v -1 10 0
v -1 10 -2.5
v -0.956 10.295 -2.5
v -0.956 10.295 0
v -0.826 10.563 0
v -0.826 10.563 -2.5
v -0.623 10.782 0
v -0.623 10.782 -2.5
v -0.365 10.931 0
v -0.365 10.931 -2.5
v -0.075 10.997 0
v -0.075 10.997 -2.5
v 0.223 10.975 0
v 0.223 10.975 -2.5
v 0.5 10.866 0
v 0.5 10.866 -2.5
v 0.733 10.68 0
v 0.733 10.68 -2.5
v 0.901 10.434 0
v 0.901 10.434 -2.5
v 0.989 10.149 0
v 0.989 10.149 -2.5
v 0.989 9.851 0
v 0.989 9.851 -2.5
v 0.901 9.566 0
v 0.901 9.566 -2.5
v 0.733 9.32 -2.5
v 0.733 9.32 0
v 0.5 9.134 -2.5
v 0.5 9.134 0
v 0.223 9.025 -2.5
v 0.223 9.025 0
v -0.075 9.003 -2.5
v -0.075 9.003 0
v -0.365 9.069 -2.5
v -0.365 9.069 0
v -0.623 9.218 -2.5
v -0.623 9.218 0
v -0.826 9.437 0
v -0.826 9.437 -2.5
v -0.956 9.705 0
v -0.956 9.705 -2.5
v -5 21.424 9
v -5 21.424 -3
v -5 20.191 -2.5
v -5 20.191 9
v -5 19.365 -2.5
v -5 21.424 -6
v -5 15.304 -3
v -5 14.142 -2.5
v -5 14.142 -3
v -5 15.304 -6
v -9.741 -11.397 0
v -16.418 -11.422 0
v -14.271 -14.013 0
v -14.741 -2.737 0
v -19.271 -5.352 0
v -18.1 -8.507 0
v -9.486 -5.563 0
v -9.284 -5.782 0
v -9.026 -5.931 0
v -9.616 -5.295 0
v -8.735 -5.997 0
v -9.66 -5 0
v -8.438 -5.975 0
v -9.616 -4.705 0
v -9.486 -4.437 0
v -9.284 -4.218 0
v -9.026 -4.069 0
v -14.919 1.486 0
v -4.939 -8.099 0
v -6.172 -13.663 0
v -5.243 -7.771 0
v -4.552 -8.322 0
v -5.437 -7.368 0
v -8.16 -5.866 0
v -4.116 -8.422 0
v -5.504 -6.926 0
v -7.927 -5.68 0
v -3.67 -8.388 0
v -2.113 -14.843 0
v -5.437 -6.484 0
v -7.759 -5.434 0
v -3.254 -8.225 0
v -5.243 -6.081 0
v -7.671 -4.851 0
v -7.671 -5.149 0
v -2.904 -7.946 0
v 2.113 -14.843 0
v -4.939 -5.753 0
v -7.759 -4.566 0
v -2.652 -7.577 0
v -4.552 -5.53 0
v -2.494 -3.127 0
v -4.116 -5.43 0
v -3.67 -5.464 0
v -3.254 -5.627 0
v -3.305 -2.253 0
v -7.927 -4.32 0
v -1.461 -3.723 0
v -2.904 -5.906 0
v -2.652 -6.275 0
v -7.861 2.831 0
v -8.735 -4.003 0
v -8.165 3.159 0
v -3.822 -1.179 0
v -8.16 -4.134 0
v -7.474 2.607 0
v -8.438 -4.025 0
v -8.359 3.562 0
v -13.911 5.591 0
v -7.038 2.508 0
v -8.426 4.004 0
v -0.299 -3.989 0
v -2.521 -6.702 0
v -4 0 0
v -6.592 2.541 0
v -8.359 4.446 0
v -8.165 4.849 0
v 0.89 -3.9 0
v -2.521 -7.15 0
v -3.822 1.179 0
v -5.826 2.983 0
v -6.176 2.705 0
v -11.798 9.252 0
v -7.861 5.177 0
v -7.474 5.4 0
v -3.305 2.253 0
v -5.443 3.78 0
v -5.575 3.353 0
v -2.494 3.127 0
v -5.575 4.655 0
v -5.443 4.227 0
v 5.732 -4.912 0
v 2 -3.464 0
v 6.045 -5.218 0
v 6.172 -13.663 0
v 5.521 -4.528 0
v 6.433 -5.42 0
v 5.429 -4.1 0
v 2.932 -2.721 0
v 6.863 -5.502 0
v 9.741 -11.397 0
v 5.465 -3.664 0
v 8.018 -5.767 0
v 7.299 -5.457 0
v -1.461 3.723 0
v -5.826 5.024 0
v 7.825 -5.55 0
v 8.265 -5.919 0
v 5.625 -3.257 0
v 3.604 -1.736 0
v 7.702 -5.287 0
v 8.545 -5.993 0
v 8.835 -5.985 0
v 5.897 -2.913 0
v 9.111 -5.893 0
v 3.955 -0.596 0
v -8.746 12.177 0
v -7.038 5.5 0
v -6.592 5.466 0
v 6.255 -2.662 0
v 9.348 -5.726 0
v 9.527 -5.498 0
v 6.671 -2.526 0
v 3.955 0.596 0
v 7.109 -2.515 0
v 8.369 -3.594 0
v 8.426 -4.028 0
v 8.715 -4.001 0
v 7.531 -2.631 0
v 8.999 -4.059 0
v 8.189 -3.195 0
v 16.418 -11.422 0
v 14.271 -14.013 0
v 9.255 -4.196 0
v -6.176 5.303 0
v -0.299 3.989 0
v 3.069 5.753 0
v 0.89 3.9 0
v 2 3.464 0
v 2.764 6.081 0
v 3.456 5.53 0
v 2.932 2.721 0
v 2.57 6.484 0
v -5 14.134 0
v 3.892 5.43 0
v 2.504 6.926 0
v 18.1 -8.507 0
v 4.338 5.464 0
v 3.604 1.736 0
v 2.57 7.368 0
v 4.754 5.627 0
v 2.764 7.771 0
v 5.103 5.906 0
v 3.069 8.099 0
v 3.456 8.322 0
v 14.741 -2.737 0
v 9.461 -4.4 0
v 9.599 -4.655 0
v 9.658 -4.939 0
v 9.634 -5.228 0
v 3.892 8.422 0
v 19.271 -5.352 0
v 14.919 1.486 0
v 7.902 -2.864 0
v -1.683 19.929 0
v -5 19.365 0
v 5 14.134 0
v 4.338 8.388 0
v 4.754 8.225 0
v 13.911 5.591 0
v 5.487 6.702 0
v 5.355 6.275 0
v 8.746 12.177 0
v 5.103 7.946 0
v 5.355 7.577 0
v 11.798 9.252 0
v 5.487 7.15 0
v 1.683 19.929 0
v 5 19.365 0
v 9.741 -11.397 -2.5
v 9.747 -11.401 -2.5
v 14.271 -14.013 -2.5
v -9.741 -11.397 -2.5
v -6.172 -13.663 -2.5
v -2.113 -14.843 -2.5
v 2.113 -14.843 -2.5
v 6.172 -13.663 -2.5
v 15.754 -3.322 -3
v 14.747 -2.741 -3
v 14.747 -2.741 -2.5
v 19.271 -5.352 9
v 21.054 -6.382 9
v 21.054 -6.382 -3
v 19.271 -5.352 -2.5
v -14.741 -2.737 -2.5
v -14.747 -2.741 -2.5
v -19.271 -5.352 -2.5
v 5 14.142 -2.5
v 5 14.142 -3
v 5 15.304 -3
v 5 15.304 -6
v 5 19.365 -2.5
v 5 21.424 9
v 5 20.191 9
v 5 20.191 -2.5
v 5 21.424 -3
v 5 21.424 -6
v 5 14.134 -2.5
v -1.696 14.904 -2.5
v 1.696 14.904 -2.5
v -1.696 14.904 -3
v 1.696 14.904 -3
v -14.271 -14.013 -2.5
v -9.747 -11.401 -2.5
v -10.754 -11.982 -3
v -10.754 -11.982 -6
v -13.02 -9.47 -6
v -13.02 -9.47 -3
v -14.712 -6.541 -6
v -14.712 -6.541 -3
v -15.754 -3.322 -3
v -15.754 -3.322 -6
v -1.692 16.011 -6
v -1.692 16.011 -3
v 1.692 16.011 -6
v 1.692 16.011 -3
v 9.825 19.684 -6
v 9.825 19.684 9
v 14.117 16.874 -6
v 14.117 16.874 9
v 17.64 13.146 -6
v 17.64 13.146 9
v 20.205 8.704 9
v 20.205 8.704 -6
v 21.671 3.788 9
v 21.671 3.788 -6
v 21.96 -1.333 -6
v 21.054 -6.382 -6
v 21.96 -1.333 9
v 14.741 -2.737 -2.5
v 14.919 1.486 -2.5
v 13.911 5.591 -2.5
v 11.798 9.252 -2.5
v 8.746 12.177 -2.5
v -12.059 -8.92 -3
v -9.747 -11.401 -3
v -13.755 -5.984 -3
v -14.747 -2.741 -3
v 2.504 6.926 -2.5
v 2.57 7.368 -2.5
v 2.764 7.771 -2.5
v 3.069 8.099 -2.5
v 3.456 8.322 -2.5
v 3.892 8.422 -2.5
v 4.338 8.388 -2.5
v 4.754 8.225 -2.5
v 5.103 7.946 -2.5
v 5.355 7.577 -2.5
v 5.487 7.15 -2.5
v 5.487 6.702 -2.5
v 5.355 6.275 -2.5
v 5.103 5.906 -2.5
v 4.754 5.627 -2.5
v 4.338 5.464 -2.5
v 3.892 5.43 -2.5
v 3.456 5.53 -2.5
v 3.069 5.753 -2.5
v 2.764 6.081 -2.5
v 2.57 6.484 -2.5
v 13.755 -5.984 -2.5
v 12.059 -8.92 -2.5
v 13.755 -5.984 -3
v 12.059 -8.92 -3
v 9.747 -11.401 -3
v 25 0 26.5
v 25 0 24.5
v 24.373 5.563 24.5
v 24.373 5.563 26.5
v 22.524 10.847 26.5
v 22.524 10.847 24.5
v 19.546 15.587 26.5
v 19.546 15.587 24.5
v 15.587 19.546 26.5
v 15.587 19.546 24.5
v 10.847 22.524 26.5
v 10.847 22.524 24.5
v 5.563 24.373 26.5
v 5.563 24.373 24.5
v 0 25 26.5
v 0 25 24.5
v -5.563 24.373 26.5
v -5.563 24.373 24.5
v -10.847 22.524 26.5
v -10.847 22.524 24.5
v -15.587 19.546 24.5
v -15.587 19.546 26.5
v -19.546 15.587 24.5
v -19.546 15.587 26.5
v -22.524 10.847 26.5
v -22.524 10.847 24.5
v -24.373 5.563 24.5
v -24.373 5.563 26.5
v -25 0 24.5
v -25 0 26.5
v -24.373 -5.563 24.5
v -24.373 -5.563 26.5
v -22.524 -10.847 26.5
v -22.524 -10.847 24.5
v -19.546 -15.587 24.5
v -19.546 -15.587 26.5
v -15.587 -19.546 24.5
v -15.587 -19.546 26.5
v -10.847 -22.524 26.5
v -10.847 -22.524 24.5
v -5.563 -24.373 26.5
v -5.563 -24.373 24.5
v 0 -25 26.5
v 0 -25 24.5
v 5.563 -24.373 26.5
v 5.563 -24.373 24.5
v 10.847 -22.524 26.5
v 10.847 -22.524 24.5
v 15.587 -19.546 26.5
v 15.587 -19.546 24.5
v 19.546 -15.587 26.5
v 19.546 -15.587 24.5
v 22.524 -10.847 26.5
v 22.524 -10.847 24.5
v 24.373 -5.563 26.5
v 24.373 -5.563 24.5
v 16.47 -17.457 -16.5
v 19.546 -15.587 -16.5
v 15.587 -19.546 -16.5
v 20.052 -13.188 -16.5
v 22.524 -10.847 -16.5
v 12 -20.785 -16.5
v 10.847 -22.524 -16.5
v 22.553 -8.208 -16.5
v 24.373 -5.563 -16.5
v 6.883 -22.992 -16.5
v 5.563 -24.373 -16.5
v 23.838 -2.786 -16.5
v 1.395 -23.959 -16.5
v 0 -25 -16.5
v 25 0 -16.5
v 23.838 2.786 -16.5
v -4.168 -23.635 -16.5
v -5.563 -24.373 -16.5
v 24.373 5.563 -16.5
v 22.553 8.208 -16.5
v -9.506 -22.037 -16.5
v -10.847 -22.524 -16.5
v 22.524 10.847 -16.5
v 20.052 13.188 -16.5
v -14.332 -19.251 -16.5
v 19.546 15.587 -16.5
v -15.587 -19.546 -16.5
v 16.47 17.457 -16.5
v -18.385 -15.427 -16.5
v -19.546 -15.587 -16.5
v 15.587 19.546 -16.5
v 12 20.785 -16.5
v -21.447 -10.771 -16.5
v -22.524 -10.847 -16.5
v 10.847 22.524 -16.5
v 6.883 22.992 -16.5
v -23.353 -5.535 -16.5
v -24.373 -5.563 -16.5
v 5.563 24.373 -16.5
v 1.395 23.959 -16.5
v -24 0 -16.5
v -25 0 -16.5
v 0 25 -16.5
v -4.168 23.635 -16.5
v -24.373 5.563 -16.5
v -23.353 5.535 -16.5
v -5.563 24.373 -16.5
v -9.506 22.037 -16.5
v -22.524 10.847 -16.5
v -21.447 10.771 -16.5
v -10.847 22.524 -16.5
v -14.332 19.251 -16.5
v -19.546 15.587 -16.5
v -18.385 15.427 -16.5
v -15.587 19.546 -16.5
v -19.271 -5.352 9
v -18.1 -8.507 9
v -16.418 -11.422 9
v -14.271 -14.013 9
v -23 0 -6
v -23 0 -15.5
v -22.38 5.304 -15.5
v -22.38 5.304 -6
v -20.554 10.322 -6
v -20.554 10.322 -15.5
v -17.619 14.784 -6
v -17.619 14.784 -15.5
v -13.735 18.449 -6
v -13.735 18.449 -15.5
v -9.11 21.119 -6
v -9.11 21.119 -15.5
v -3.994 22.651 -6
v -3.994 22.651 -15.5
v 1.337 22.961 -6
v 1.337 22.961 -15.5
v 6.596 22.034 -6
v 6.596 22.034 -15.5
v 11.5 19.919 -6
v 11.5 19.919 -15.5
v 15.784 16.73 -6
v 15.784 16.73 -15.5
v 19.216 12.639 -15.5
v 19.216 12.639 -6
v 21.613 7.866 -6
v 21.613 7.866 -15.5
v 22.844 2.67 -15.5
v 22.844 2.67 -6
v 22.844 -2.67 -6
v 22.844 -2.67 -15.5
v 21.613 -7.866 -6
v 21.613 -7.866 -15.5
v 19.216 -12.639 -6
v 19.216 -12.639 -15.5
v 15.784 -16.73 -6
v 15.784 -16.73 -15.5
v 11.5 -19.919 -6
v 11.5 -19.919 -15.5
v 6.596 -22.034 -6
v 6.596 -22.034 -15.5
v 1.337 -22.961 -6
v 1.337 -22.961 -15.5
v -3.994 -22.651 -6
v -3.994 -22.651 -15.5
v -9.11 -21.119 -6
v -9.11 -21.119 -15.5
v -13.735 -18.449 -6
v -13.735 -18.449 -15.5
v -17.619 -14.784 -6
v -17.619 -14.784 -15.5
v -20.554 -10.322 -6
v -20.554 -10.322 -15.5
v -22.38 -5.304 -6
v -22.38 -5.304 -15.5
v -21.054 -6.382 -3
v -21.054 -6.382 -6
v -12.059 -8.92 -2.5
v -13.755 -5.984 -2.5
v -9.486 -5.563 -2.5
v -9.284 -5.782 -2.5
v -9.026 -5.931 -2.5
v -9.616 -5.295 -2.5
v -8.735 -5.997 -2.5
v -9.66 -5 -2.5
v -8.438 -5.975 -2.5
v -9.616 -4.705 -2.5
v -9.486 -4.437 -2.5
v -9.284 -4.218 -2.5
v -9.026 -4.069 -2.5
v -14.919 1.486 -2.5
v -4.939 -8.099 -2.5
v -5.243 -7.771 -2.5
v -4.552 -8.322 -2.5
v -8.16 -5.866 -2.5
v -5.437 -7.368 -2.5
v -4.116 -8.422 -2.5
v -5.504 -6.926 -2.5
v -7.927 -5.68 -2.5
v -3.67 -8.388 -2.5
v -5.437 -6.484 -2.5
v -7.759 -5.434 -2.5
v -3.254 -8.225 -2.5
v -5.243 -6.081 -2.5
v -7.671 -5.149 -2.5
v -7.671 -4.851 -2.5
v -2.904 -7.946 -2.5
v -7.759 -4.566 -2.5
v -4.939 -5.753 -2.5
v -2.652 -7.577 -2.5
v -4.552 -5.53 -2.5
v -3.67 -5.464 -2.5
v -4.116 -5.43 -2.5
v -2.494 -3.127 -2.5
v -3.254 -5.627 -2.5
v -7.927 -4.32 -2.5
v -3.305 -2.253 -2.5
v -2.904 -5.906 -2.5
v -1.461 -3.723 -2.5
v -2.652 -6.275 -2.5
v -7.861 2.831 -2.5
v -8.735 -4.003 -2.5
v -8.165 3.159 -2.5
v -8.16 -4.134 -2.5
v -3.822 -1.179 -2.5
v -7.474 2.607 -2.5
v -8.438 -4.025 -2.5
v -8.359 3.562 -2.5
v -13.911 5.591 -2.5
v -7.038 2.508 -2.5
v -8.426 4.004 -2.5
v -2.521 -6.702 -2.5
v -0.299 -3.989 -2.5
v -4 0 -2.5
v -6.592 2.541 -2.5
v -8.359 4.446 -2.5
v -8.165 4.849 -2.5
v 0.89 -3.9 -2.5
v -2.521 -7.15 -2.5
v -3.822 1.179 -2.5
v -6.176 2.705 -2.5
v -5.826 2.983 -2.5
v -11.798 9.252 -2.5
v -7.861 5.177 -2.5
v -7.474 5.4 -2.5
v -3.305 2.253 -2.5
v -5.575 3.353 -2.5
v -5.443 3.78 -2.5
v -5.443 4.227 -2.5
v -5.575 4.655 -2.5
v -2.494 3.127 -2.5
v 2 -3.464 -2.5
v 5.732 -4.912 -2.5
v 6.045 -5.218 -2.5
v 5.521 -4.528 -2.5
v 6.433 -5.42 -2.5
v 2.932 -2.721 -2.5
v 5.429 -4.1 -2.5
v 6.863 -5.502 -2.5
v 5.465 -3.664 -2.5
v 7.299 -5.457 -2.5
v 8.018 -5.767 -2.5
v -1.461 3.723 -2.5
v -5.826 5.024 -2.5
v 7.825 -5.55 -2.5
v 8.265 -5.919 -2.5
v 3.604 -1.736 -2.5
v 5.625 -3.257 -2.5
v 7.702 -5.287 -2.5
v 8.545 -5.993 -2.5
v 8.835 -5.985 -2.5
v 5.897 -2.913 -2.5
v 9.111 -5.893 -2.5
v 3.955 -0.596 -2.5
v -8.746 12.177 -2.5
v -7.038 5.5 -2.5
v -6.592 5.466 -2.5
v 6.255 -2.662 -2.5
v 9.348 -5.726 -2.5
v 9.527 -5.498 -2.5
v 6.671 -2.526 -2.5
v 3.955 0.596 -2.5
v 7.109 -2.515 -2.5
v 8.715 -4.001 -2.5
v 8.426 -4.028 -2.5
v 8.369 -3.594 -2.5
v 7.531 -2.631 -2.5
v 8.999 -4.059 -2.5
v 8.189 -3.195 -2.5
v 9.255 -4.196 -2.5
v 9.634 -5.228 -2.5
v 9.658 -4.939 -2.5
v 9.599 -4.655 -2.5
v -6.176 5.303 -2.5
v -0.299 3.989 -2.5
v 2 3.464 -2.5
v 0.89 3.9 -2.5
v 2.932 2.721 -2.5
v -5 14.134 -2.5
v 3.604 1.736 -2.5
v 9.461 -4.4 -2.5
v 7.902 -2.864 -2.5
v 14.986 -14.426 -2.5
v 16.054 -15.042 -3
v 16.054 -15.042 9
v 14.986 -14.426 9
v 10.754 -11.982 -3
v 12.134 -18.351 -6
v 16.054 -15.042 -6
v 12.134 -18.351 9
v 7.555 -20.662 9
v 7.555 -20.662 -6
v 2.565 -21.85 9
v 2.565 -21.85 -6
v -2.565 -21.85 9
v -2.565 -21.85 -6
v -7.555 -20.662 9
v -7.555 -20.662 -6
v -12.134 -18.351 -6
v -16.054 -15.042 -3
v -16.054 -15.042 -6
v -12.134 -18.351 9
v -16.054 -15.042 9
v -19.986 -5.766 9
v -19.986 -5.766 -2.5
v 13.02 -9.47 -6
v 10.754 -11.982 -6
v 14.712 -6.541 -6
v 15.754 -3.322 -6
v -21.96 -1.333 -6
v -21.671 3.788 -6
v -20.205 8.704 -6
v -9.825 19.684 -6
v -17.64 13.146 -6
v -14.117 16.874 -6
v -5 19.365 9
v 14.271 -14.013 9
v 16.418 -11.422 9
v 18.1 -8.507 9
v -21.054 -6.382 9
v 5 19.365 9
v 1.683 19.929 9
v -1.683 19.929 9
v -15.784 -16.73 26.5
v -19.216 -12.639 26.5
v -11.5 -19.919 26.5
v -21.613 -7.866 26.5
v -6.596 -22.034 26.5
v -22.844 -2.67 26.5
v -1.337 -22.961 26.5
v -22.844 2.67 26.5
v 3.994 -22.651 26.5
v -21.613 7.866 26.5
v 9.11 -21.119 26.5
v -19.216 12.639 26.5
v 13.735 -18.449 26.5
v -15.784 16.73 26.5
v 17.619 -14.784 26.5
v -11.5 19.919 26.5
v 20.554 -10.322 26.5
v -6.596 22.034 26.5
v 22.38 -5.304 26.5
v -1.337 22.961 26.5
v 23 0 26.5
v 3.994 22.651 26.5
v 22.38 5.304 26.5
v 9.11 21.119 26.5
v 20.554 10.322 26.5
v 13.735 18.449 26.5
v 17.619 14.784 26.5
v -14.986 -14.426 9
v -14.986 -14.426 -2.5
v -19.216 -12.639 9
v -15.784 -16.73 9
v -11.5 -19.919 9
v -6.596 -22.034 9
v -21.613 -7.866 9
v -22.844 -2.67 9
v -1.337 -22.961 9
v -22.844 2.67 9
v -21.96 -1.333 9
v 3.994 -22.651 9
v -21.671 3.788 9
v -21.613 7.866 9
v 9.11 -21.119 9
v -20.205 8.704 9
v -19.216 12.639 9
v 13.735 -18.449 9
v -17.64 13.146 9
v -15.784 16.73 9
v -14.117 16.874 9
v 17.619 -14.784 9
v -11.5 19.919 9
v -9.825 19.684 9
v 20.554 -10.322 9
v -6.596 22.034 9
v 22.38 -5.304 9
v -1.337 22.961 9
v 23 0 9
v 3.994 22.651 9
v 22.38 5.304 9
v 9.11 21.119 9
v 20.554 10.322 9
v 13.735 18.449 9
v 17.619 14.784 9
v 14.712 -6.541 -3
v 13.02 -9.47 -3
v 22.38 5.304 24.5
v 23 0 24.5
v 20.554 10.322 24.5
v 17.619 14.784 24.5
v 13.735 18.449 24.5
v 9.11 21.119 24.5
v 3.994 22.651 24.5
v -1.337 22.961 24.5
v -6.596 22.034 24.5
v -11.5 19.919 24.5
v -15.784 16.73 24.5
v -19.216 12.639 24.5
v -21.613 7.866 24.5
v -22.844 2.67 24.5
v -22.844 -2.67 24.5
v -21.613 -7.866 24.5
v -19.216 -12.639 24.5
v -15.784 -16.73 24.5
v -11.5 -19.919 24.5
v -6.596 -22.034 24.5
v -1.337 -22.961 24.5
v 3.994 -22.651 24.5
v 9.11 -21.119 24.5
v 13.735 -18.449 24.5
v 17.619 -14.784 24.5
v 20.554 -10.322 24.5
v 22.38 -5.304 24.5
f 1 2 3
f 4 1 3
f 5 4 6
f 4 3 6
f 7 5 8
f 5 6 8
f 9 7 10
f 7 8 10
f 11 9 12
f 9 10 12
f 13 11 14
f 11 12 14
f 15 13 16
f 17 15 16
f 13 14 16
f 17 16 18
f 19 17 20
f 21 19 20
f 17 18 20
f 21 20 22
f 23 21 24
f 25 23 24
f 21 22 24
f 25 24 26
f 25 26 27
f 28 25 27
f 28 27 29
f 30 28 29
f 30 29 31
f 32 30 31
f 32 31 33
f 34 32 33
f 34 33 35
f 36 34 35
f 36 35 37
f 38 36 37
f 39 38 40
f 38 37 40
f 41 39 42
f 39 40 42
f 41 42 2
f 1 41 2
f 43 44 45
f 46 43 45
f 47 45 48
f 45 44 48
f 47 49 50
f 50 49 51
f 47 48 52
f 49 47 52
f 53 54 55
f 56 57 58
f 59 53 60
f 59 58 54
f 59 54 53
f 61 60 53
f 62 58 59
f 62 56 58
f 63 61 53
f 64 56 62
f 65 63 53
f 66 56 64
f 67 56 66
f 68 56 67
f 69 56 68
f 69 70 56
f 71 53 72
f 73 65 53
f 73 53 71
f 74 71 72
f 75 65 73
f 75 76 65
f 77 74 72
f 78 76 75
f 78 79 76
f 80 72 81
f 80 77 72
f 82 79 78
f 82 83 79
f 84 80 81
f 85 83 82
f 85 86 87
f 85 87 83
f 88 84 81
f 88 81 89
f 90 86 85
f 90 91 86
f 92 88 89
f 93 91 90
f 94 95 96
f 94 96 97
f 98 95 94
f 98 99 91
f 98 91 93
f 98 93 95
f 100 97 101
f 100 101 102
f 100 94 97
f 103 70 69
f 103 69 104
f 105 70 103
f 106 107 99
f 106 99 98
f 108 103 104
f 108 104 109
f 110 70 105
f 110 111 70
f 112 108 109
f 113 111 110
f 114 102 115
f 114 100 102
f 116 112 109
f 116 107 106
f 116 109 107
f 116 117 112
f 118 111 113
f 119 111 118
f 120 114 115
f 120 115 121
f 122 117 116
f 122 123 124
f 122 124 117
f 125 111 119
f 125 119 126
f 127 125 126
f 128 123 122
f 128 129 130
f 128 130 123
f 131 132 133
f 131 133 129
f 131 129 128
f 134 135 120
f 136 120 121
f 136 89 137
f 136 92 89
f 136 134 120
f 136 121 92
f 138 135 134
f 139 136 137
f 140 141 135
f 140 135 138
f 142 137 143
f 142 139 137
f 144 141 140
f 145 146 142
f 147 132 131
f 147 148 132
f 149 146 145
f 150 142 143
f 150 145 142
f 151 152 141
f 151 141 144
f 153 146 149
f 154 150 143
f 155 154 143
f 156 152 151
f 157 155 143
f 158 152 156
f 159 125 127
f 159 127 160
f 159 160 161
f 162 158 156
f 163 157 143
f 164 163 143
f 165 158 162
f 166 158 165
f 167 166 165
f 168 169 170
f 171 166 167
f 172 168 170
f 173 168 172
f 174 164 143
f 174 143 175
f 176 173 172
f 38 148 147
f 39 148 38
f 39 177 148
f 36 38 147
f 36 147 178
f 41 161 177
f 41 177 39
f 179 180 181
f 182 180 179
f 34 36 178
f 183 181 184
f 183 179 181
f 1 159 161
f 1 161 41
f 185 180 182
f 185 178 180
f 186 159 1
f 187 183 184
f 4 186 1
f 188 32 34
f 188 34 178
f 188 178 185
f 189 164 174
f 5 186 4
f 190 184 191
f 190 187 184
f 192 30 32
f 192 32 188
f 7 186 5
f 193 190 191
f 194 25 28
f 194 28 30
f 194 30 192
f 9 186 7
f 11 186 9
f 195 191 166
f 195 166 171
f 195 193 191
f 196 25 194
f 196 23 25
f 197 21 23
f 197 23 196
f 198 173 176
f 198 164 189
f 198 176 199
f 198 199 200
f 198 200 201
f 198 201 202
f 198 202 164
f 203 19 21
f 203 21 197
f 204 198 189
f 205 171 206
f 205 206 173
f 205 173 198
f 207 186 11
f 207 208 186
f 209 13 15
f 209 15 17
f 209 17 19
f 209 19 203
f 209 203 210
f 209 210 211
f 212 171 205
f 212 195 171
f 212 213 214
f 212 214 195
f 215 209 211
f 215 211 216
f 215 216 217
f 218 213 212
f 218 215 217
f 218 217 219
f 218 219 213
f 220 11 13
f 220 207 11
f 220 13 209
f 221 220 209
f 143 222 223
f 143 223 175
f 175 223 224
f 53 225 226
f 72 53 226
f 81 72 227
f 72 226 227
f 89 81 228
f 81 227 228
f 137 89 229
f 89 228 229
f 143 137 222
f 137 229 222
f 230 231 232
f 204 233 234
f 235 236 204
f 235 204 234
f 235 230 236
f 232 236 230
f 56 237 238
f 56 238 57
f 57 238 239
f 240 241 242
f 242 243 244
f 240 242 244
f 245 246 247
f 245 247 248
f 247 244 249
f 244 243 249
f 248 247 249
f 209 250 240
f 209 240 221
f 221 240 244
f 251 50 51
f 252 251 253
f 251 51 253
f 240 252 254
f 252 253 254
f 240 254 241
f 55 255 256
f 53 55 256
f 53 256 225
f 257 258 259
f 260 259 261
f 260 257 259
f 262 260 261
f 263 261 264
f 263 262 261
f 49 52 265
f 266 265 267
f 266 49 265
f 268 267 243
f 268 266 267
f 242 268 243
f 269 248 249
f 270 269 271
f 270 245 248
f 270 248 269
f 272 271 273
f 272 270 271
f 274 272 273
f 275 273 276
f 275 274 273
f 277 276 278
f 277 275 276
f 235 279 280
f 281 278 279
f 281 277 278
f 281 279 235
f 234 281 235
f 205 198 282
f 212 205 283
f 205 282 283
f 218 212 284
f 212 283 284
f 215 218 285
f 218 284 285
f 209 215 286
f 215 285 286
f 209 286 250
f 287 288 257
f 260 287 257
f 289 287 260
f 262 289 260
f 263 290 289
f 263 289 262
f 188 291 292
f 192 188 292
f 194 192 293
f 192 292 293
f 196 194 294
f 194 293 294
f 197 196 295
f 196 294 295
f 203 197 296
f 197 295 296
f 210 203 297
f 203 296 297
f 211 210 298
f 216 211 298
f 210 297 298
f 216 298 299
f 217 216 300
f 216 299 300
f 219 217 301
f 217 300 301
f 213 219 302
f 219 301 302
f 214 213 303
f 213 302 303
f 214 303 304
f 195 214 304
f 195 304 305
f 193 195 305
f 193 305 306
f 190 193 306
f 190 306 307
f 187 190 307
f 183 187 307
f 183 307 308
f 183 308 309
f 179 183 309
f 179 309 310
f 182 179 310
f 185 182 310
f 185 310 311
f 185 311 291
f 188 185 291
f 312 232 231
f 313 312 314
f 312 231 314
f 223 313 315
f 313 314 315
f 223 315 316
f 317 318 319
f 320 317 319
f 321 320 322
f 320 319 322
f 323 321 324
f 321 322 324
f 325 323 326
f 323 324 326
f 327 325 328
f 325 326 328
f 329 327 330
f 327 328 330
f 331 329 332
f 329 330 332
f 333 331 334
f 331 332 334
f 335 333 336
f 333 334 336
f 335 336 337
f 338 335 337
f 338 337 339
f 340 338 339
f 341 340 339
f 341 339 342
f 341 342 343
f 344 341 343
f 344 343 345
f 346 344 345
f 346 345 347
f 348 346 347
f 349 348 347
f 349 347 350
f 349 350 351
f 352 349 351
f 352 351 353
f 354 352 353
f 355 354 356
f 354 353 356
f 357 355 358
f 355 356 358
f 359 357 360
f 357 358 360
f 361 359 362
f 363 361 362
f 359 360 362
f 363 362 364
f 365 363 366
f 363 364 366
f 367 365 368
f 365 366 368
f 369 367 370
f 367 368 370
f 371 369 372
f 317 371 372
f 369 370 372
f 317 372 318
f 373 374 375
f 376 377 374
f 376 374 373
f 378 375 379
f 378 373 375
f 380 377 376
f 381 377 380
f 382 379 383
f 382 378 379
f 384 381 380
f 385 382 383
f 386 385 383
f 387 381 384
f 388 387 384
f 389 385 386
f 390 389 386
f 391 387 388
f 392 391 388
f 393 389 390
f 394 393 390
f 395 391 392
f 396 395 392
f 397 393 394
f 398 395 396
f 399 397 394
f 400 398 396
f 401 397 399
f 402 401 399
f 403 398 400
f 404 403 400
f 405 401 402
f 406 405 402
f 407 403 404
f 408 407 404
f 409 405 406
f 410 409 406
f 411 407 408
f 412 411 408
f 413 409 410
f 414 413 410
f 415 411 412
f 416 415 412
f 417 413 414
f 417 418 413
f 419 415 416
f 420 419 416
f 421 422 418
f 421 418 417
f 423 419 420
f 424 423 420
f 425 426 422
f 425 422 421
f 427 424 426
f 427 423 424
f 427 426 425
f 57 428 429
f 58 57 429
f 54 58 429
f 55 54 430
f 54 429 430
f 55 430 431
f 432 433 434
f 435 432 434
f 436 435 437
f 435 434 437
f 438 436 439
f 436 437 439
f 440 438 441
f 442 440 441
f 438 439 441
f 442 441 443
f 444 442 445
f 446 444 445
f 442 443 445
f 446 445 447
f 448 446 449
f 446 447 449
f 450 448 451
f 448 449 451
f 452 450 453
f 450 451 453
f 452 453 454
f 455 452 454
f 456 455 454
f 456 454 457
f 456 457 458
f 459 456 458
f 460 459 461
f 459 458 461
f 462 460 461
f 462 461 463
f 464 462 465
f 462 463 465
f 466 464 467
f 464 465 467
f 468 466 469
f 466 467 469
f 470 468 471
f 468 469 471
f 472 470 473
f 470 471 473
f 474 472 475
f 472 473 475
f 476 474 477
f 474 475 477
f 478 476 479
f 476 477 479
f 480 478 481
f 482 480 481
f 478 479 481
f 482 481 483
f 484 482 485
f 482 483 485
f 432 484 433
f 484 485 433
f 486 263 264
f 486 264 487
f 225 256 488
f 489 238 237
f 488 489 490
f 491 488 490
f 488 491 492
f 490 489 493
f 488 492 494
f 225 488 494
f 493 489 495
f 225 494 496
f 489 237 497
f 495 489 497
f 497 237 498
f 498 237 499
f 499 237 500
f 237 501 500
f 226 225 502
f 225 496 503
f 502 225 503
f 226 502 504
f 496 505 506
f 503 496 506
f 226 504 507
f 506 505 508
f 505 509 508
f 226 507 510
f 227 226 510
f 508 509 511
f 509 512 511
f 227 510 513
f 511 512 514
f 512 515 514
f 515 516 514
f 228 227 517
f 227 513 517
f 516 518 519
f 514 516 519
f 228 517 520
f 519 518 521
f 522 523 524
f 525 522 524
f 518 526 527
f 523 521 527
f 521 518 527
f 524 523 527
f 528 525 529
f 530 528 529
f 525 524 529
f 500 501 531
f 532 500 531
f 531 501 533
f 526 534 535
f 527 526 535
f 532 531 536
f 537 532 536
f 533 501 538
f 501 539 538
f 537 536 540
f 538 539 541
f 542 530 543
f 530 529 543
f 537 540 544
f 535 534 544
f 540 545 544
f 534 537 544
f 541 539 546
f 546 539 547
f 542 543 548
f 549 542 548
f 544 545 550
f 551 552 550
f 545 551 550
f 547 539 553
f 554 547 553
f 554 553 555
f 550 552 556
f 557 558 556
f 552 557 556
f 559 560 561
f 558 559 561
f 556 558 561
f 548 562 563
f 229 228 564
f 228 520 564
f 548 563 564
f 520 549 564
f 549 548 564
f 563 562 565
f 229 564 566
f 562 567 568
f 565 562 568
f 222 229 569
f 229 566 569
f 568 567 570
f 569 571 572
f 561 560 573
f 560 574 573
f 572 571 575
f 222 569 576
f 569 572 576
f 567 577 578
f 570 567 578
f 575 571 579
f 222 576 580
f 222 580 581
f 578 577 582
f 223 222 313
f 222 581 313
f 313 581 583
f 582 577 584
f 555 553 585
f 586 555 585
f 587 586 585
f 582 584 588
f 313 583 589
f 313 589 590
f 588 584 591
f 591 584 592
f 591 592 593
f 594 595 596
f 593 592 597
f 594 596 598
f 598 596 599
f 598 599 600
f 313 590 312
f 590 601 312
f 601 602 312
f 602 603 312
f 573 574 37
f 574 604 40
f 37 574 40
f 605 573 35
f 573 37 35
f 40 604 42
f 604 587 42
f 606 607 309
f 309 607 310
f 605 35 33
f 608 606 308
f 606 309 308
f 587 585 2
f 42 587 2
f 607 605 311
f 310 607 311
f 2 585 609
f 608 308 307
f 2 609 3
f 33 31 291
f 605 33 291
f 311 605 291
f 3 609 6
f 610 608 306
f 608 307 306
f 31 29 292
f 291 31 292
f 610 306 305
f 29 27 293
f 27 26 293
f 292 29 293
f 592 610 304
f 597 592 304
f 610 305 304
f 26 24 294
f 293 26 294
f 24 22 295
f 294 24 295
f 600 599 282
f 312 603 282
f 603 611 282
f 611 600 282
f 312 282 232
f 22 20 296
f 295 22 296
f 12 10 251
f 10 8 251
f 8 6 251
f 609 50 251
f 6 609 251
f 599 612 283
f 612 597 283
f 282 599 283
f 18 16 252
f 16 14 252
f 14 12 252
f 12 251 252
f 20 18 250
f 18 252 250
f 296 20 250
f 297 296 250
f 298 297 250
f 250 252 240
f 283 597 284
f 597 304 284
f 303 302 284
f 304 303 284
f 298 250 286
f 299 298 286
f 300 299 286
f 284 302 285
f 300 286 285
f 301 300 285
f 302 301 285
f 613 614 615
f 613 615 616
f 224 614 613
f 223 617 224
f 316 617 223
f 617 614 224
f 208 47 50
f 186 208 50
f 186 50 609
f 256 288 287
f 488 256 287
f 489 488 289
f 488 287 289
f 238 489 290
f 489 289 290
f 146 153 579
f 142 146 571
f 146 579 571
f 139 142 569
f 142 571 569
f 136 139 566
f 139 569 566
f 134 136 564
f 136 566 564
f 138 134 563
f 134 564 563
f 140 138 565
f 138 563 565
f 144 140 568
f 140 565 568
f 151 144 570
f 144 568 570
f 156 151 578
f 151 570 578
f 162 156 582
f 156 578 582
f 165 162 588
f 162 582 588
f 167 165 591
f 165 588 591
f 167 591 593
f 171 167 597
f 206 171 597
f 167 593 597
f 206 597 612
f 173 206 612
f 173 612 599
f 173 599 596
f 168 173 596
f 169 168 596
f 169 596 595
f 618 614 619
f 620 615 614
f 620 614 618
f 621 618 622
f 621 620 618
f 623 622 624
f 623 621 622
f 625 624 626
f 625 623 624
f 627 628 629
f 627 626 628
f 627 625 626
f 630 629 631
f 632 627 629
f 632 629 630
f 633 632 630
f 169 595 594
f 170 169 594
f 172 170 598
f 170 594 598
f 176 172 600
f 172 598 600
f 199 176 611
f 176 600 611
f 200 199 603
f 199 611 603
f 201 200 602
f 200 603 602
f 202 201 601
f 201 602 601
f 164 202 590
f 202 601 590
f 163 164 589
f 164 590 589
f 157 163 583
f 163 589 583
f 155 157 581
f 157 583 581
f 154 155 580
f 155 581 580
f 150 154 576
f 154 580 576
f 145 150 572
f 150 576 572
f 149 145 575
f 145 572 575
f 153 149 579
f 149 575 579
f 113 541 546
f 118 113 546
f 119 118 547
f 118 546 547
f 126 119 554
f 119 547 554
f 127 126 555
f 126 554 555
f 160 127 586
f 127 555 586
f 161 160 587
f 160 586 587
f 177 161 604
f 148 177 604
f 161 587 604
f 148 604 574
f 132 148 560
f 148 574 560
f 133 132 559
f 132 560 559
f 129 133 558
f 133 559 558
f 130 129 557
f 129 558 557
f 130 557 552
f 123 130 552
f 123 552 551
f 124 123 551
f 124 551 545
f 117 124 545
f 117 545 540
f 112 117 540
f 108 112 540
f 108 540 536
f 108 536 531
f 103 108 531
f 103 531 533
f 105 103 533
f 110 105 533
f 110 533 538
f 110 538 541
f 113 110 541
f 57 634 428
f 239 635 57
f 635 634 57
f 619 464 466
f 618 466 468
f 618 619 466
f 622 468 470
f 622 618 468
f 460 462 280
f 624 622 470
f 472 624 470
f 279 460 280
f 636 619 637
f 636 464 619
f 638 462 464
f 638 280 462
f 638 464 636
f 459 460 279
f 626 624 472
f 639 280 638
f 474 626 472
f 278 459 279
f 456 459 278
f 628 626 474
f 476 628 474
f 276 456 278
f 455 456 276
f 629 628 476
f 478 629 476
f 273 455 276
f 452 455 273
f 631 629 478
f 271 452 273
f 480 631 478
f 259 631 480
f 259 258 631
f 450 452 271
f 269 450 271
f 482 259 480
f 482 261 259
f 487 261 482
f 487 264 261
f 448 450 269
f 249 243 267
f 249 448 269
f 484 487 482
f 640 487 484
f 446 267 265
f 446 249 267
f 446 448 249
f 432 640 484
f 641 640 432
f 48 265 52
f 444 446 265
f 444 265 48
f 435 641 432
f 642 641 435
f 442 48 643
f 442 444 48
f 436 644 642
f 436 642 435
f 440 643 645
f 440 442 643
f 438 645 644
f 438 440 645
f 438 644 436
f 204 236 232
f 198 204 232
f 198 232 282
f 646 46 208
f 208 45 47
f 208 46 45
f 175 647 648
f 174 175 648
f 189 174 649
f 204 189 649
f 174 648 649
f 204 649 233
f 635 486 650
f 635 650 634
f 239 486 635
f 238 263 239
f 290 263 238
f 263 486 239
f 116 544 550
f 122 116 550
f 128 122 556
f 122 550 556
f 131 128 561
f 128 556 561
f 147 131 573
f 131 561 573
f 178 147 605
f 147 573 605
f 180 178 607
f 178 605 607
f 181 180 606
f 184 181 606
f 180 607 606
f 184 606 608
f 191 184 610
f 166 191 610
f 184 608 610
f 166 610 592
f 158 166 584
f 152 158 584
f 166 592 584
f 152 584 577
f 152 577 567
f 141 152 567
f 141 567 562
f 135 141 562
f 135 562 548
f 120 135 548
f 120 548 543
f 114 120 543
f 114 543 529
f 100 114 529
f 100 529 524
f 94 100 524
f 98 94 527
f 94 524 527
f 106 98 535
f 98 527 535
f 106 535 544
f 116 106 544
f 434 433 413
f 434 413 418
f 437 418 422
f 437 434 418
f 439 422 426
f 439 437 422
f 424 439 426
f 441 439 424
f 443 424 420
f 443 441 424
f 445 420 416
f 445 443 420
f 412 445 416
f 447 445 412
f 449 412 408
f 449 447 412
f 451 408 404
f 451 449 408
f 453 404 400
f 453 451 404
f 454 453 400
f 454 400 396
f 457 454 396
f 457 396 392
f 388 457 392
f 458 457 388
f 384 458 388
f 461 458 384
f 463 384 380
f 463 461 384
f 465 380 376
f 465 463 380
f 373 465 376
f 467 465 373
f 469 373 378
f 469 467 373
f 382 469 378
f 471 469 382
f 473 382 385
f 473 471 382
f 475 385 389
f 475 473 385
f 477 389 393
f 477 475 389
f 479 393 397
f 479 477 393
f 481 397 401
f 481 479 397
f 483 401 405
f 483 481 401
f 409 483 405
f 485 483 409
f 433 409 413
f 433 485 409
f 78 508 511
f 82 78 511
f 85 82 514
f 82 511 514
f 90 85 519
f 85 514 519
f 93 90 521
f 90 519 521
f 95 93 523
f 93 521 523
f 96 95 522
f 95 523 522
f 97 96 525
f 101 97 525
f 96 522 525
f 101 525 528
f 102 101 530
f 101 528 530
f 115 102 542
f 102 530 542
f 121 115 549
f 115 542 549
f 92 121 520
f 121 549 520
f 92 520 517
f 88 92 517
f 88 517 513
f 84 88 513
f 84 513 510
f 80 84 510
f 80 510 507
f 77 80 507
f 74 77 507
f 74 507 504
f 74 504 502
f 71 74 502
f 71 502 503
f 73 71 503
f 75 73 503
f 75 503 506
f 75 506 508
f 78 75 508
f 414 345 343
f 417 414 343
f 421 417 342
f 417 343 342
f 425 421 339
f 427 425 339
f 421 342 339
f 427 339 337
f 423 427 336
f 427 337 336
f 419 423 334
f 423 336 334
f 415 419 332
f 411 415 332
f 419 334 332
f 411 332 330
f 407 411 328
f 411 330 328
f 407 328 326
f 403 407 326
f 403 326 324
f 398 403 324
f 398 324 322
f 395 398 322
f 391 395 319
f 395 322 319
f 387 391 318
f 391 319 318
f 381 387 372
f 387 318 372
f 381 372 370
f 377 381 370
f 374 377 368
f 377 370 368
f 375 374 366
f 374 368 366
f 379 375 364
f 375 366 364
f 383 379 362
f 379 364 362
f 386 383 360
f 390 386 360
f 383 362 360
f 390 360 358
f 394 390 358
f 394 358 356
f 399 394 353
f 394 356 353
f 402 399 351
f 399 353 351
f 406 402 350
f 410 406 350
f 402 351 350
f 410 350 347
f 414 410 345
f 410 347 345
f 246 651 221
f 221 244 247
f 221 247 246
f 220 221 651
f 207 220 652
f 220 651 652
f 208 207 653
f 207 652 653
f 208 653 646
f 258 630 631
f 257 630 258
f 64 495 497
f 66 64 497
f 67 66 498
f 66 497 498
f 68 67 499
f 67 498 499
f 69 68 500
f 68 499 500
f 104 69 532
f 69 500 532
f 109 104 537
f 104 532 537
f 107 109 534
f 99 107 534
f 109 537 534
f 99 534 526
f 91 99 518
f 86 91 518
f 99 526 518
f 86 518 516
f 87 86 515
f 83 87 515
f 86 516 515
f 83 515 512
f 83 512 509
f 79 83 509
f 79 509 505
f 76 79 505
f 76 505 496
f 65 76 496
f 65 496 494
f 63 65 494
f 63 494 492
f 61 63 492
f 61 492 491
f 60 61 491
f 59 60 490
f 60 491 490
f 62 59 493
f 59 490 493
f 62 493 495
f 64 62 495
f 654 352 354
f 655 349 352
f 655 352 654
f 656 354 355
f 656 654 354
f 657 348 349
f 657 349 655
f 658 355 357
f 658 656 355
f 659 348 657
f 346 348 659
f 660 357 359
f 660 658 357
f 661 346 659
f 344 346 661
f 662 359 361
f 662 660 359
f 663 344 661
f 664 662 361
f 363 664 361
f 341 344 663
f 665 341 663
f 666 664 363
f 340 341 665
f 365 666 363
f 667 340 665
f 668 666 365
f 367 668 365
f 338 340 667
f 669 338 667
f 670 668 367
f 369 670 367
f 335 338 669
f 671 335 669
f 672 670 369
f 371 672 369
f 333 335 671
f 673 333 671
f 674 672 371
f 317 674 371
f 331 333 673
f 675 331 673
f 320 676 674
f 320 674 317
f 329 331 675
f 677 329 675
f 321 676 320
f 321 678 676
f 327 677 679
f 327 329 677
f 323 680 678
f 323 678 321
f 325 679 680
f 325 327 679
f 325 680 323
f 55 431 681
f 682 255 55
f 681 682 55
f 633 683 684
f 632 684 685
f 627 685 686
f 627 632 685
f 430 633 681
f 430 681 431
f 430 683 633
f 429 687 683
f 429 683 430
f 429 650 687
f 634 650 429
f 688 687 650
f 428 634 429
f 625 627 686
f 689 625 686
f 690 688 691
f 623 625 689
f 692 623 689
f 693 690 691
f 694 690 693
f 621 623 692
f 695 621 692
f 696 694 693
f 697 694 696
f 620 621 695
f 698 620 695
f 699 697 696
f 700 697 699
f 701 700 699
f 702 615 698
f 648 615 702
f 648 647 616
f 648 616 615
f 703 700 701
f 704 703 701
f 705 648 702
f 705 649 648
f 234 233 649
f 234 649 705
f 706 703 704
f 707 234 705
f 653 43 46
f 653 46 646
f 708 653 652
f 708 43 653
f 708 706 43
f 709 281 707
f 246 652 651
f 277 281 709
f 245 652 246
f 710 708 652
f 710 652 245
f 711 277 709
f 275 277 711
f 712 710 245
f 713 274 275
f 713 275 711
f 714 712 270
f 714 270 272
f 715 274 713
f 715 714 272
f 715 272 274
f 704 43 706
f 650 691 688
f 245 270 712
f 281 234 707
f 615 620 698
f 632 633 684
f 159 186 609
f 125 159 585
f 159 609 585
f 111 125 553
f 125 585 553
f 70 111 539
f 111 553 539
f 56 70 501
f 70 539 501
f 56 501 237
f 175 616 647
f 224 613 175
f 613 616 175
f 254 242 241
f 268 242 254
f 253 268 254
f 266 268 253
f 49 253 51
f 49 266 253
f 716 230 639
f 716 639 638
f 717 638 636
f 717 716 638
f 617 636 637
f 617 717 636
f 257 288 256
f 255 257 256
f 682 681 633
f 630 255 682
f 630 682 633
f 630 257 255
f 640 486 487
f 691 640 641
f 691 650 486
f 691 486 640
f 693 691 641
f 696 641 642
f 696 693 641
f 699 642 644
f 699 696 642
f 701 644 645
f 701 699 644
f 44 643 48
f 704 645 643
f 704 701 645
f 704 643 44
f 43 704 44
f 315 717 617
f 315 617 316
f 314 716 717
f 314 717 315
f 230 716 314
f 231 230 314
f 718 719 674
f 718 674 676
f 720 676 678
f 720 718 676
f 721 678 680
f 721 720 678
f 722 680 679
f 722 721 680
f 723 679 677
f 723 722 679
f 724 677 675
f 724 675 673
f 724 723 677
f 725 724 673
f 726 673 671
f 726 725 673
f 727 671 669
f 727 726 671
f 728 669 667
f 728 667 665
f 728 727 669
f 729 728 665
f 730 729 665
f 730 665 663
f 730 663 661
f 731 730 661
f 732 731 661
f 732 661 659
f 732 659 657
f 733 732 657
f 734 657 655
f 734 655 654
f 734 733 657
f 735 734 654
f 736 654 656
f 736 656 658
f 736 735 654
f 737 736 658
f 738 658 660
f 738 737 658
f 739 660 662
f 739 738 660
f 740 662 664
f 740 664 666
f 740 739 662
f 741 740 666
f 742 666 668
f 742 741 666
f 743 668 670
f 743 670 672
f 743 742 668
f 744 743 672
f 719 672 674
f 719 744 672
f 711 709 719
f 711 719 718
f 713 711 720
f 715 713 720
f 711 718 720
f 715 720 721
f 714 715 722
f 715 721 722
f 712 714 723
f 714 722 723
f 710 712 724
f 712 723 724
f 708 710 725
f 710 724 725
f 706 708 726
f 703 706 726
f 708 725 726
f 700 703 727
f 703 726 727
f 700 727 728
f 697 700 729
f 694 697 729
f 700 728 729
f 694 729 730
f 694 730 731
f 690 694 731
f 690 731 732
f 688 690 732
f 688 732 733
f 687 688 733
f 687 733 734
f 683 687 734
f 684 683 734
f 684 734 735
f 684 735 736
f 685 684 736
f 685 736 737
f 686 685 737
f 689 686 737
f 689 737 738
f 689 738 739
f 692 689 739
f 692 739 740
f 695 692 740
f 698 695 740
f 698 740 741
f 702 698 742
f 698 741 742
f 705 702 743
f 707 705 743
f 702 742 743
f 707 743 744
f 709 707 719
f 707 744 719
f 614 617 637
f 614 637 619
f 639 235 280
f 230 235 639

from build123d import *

# Parameters (mm, degrees)
SKETCH_1_R           = 22
SKETCH_1_R_2         = 17
EXTRUDE_1_DEPTH      = 9
SKETCH_2_R           = 22
EXTRUDE_2_DEPTH      = 3
SKETCH_3_R           = 1
CUT_EXTRUDE_1_DEPTH  = 3
CUT_EXTRUDE_2_DEPTH  = 25
SKETCH_5_R           = 4
CUT_EXTRUDE_3_DEPTH  = 10
FILLET_1_R           = 10
FILLET_2_R           = 10
SKETCH_7_R           = 25
SKETCH_7_R_2         = 22
EXTRUDE_3_DEPTH      = 30
EXTRUDE_4_DEPTH      = 4
SKETCH_9_R           = 38.67245247
CUT_EXTRUDE_4_DEPTH  = 1
SKETCH_10_R          = 25
SKETCH_10_R_2        = 22
EXTRUDE_5_DEPTH      = 13.5
SKETCH_11_R          = 23
CUT_EXTRUDE_5_DEPTH  = 10.5
CHAMFER_2_SIZE       = 1
SKETCH_12_R          = 23
CUT_EXTRUDE_6_DEPTH  = 18
SKETCH_13_R          = 39.83087954
CUT_EXTRUDE_7_DEPTH  = 2.5
SKETCH_14_R          = 15
CUT_EXTRUDE_8_DEPTH  = 0.5
SKETCH_15_R          = 25
SKETCH_15_R_2        = 23
EXTRUDE_6_DEPTH      = 2
SKETCH_16_R          = 20
CUT_EXTRUDE_9_DEPTH  = 9
SKETCH_17_R          = 20
SKETCH_17_R_2        = 1
SKETCH_17_R_3        = 4
EXTRUDE_7_DEPTH      = 2.5
SKETCH_18_R          = 1.5
CUT_EXTRUDE_10_DEPTH = 21.5
CUT_EXTRUDE_11_DEPTH = 21.5


with BuildPart() as part:
    # 草图1 → 凸台-拉伸1 (new body)
    with BuildSketch(Plane.XY):
        Circle(SKETCH_1_R)
        Circle(SKETCH_1_R_2, mode=Mode.SUBTRACT)
    extrude(amount=EXTRUDE_1_DEPTH)

    # 草图2 → 凸台-拉伸2 (add)
    with BuildSketch(Plane(origin=(0, 0, 0), x_dir=(-1, 0, 0), z_dir=(0, 0, -1))):
        Circle(SKETCH_2_R)
    extrude(amount=EXTRUDE_2_DEPTH)

    # 草图3 → 切除-拉伸1 (cut)
    with BuildSketch(Plane(origin=(0, 0, -3), x_dir=(-1, 0, 0), z_dir=(0, 0, -1))):
        with Locations((0, 10)):
            Circle(SKETCH_3_R)
        with Locations((8.660254038, -5)):
            Circle(SKETCH_3_R)
        with Locations((-8.660254038, -5)):
            Circle(SKETCH_3_R)
    extrude(amount=-CUT_EXTRUDE_1_DEPTH, mode=Mode.SUBTRACT)

    # 草图4 → 切除-拉伸2 (cut)
    with BuildSketch(Plane(origin=(0, 0, -3), x_dir=(-1, 0, 0), z_dir=(0, 0, -1))):
        Polygon((24.787699458, -8.537682263), (5, 2.886751346), (5, 15), (5, 31.006622637), (28.596284234, 19.54376122), align=None)
        Polygon((-6.160254038, -9.330127019), (0, -5.773502692), (19.787699458, -17.197936301), (-4.03507969, -32.43608202), (-23.902747272, -19.573760264), align=None)
        Polygon((-5, 10), (-5, 2.886751346), (-28.902747272, -10.913506226), (-27.638085306, 27.170625695), (-5, 31.006622637), align=None)
    extrude(amount=-CUT_EXTRUDE_2_DEPTH, mode=Mode.SUBTRACT)

    # 草图5 → 切除-拉伸3 (cut)
    with BuildSketch(Plane(origin=(0, 0, -3), x_dir=(-1, 0, 0), z_dir=(0, 0, -1))):
        Circle(SKETCH_5_R)
    extrude(amount=-CUT_EXTRUDE_3_DEPTH, mode=Mode.SUBTRACT)

    # 圆角1
    fillet_1_edges = [part.edges().sort_by_distance(p)[0] for p in [
        (-5, 2.886751346, -1.5),
    ]]
    fillet(fillet_1_edges, radius=FILLET_1_R)

    # 圆角2
    fillet_2_edges = [part.edges().sort_by_distance(p)[0] for p in [
        (5, 2.886751346, -1.5),
        (0, -5.773502692, -1.5),
    ]]
    fillet(fillet_2_edges, radius=FILLET_2_R)

    # 草图7 → 凸台-拉伸3 (add)
    with BuildSketch(Plane(origin=(0, 0, -3), x_dir=(-1, 0, 0), z_dir=(0, 0, -1))):
        Circle(SKETCH_7_R)
        Circle(SKETCH_7_R_2, mode=Mode.SUBTRACT)
    extrude(amount=-EXTRUDE_3_DEPTH)

    # 草图8 → 凸台-拉伸4 (add)
    with BuildSketch(Plane(origin=(0, 0, -3), x_dir=(-1, 0, 0), z_dir=(0, 0, -1))):
        with BuildLine():
            Line((-21.053975315, -6.382015624), (-15.753584421, -3.321833514))
            ThreePointArc((-15.753584421, -3.321833514), (-13.943009001, -8.05), (-10.753584421, -11.982087552))
            Line((-10.753584421, -11.982087552), (-16.053975315, -15.042269662))
            ThreePointArc((-16.053975315, -15.042269662), (-19.052558883, -11), (-21.053975315, -6.382015624))
        make_face()
        with BuildLine():
            Line((16.053975315, -15.042269662), (10.753584421, -11.982087552))
            ThreePointArc((10.753584421, -11.982087552), (13.943009001, -8.05), (15.753584421, -3.321833514))
            Line((15.753584421, -3.321833514), (21.053975315, -6.382015624))
            ThreePointArc((21.053975315, -6.382015624), (19.052558883, -11), (16.053975315, -15.042269662))
        make_face()
        with BuildLine():
            Line((5, 21.424285286), (5, 15.303921066))
            ThreePointArc((5, 15.303921066), (0, 16.1), (-5, 15.303921066))
            Line((-5, 15.303921066), (-5, 21.424285286))
            ThreePointArc((-5, 21.424285286), (0, 22), (5, 21.424285286))
        make_face()
    extrude(amount=EXTRUDE_4_DEPTH)

    # 草图9 → 切除-拉伸4 (cut)
    with BuildSketch(Plane(origin=(0, 0, -7), x_dir=(-1, 0, 0), z_dir=(0, 0, -1))):
        Circle(SKETCH_9_R)
    extrude(amount=-CUT_EXTRUDE_4_DEPTH, mode=Mode.SUBTRACT)

    # 草图10 → 凸台-拉伸5 (add)
    with BuildSketch(Plane(origin=(0, 0, -3), x_dir=(-1, 0, 0), z_dir=(0, 0, -1))):
        Circle(SKETCH_10_R)
        Circle(SKETCH_10_R_2, mode=Mode.SUBTRACT)
    extrude(amount=EXTRUDE_5_DEPTH)

    # 草图11 → 切除-拉伸5 (cut)
    with BuildSketch(Plane(origin=(0, 0, -16.5), x_dir=(-1, 0, 0), z_dir=(0, 0, -1))):
        Circle(SKETCH_11_R)
    extrude(amount=-CUT_EXTRUDE_5_DEPTH, mode=Mode.SUBTRACT)

    # 倒角2
    chamfer_2_edges = [part.edges().sort_by_distance(p)[0] for p in [
        (23, 0, -16.5),
    ]]
    chamfer(chamfer_2_edges, length=CHAMFER_2_SIZE)

    # 草图12 → 切除-拉伸6 (cut)
    with BuildSketch(Plane.XY.offset(27)):
        Circle(SKETCH_12_R)
    extrude(amount=-CUT_EXTRUDE_6_DEPTH, mode=Mode.SUBTRACT)

    # 草图13 → 切除-拉伸7 (cut)
    with BuildSketch(Plane.XY.offset(27)):
        Circle(SKETCH_13_R)
    extrude(amount=-CUT_EXTRUDE_7_DEPTH, mode=Mode.SUBTRACT)

    # 草图14 → 切除-拉伸8 (cut)
    with BuildSketch(Plane(origin=(0, 0, -3), x_dir=(-1, 0, 0), z_dir=(0, 0, -1))):
        Circle(SKETCH_14_R)
    extrude(amount=-CUT_EXTRUDE_8_DEPTH, mode=Mode.SUBTRACT)

    # 草图15 → 凸台-拉伸6 (add)
    with BuildSketch(Plane.XY.offset(24.5)):
        Circle(SKETCH_15_R)
        Circle(SKETCH_15_R_2, mode=Mode.SUBTRACT)
    extrude(amount=EXTRUDE_6_DEPTH)

    # 草图16 → 切除-拉伸9 (cut)
    with BuildSketch(Plane.XY.offset(9)):
        Circle(SKETCH_16_R)
    extrude(amount=-CUT_EXTRUDE_9_DEPTH, mode=Mode.SUBTRACT)

    # 草图17 → 凸台-拉伸7 (add)
    with BuildSketch(Plane.XY):
        Circle(SKETCH_17_R)
        with Locations((8.660254038, -5)):
            Circle(SKETCH_17_R_2, mode=Mode.SUBTRACT)
        with Locations((-8.660254038, -5)):
            Circle(SKETCH_17_R_2, mode=Mode.SUBTRACT)
        with Locations((0, 10)):
            Circle(SKETCH_17_R_2, mode=Mode.SUBTRACT)
        Circle(SKETCH_17_R_3, mode=Mode.SUBTRACT)
    extrude(amount=-EXTRUDE_7_DEPTH)

    # 草图18 → 切除-拉伸10 (cut)
    with BuildSketch(Plane(origin=(0, 0, -2.5), x_dir=(-1, 0, 0), z_dir=(0, 0, -1))):
        with Locations((-6.92603443, -4.003754122)):
            Circle(SKETCH_18_R)
        with Locations((-4.003754122, 6.92603443)):
            Circle(SKETCH_18_R)
        with Locations((6.92603443, 4.003754122)):
            Circle(SKETCH_18_R)
        with Locations((4.003754122, -6.92603443)):
            Circle(SKETCH_18_R)
    extrude(amount=-CUT_EXTRUDE_10_DEPTH, mode=Mode.SUBTRACT)

    # 草图19 → 切除-拉伸11 (cut)
    with BuildSketch(Plane(origin=(0, 0, -2.5), x_dir=(-1, 0, 0), z_dir=(0, 0, -1))):
        with BuildLine():
            Line((-19.986274047, -5.765578009), (-14.740678373, -2.737031935))
            ThreePointArc((-14.740678373, -2.737031935), (-12.983998114, 7.496314806), (-5, 14.134317907))
            Line((-5, 14.134317907), (-5, 20.191410056))
            ThreePointArc((-5, 20.191410056), (-18.014432548, 10.400637481), (-19.986274047, -5.765578009))
        make_face()
        with BuildLine():
            Line((5, 20.191410056), (5, 14.134317907))
            ThreePointArc((5, 14.134317907), (12.983998114, 7.496314806), (14.740678373, -2.737031935))
            Line((14.740678373, -2.737031935), (19.986274047, -5.765578009))
            ThreePointArc((19.986274047, -5.765578009), (18.014432548, 10.400637481), (5, 20.191410056))
        make_face()
        with BuildLine():
            Line((14.986274047, -14.425832047), (9.740678373, -11.397285972))
            ThreePointArc((9.740678373, -11.397285972), (0, -14.992629613), (-9.740678373, -11.397285972))
            Line((-9.740678373, -11.397285972), (-14.986274047, -14.425832047))
            ThreePointArc((-14.986274047, -14.425832047), (0, -20.801274962), (14.986274047, -14.425832047))
        make_face()
    extrude(amount=-CUT_EXTRUDE_11_DEPTH, mode=Mode.SUBTRACT)


solid = part.part
